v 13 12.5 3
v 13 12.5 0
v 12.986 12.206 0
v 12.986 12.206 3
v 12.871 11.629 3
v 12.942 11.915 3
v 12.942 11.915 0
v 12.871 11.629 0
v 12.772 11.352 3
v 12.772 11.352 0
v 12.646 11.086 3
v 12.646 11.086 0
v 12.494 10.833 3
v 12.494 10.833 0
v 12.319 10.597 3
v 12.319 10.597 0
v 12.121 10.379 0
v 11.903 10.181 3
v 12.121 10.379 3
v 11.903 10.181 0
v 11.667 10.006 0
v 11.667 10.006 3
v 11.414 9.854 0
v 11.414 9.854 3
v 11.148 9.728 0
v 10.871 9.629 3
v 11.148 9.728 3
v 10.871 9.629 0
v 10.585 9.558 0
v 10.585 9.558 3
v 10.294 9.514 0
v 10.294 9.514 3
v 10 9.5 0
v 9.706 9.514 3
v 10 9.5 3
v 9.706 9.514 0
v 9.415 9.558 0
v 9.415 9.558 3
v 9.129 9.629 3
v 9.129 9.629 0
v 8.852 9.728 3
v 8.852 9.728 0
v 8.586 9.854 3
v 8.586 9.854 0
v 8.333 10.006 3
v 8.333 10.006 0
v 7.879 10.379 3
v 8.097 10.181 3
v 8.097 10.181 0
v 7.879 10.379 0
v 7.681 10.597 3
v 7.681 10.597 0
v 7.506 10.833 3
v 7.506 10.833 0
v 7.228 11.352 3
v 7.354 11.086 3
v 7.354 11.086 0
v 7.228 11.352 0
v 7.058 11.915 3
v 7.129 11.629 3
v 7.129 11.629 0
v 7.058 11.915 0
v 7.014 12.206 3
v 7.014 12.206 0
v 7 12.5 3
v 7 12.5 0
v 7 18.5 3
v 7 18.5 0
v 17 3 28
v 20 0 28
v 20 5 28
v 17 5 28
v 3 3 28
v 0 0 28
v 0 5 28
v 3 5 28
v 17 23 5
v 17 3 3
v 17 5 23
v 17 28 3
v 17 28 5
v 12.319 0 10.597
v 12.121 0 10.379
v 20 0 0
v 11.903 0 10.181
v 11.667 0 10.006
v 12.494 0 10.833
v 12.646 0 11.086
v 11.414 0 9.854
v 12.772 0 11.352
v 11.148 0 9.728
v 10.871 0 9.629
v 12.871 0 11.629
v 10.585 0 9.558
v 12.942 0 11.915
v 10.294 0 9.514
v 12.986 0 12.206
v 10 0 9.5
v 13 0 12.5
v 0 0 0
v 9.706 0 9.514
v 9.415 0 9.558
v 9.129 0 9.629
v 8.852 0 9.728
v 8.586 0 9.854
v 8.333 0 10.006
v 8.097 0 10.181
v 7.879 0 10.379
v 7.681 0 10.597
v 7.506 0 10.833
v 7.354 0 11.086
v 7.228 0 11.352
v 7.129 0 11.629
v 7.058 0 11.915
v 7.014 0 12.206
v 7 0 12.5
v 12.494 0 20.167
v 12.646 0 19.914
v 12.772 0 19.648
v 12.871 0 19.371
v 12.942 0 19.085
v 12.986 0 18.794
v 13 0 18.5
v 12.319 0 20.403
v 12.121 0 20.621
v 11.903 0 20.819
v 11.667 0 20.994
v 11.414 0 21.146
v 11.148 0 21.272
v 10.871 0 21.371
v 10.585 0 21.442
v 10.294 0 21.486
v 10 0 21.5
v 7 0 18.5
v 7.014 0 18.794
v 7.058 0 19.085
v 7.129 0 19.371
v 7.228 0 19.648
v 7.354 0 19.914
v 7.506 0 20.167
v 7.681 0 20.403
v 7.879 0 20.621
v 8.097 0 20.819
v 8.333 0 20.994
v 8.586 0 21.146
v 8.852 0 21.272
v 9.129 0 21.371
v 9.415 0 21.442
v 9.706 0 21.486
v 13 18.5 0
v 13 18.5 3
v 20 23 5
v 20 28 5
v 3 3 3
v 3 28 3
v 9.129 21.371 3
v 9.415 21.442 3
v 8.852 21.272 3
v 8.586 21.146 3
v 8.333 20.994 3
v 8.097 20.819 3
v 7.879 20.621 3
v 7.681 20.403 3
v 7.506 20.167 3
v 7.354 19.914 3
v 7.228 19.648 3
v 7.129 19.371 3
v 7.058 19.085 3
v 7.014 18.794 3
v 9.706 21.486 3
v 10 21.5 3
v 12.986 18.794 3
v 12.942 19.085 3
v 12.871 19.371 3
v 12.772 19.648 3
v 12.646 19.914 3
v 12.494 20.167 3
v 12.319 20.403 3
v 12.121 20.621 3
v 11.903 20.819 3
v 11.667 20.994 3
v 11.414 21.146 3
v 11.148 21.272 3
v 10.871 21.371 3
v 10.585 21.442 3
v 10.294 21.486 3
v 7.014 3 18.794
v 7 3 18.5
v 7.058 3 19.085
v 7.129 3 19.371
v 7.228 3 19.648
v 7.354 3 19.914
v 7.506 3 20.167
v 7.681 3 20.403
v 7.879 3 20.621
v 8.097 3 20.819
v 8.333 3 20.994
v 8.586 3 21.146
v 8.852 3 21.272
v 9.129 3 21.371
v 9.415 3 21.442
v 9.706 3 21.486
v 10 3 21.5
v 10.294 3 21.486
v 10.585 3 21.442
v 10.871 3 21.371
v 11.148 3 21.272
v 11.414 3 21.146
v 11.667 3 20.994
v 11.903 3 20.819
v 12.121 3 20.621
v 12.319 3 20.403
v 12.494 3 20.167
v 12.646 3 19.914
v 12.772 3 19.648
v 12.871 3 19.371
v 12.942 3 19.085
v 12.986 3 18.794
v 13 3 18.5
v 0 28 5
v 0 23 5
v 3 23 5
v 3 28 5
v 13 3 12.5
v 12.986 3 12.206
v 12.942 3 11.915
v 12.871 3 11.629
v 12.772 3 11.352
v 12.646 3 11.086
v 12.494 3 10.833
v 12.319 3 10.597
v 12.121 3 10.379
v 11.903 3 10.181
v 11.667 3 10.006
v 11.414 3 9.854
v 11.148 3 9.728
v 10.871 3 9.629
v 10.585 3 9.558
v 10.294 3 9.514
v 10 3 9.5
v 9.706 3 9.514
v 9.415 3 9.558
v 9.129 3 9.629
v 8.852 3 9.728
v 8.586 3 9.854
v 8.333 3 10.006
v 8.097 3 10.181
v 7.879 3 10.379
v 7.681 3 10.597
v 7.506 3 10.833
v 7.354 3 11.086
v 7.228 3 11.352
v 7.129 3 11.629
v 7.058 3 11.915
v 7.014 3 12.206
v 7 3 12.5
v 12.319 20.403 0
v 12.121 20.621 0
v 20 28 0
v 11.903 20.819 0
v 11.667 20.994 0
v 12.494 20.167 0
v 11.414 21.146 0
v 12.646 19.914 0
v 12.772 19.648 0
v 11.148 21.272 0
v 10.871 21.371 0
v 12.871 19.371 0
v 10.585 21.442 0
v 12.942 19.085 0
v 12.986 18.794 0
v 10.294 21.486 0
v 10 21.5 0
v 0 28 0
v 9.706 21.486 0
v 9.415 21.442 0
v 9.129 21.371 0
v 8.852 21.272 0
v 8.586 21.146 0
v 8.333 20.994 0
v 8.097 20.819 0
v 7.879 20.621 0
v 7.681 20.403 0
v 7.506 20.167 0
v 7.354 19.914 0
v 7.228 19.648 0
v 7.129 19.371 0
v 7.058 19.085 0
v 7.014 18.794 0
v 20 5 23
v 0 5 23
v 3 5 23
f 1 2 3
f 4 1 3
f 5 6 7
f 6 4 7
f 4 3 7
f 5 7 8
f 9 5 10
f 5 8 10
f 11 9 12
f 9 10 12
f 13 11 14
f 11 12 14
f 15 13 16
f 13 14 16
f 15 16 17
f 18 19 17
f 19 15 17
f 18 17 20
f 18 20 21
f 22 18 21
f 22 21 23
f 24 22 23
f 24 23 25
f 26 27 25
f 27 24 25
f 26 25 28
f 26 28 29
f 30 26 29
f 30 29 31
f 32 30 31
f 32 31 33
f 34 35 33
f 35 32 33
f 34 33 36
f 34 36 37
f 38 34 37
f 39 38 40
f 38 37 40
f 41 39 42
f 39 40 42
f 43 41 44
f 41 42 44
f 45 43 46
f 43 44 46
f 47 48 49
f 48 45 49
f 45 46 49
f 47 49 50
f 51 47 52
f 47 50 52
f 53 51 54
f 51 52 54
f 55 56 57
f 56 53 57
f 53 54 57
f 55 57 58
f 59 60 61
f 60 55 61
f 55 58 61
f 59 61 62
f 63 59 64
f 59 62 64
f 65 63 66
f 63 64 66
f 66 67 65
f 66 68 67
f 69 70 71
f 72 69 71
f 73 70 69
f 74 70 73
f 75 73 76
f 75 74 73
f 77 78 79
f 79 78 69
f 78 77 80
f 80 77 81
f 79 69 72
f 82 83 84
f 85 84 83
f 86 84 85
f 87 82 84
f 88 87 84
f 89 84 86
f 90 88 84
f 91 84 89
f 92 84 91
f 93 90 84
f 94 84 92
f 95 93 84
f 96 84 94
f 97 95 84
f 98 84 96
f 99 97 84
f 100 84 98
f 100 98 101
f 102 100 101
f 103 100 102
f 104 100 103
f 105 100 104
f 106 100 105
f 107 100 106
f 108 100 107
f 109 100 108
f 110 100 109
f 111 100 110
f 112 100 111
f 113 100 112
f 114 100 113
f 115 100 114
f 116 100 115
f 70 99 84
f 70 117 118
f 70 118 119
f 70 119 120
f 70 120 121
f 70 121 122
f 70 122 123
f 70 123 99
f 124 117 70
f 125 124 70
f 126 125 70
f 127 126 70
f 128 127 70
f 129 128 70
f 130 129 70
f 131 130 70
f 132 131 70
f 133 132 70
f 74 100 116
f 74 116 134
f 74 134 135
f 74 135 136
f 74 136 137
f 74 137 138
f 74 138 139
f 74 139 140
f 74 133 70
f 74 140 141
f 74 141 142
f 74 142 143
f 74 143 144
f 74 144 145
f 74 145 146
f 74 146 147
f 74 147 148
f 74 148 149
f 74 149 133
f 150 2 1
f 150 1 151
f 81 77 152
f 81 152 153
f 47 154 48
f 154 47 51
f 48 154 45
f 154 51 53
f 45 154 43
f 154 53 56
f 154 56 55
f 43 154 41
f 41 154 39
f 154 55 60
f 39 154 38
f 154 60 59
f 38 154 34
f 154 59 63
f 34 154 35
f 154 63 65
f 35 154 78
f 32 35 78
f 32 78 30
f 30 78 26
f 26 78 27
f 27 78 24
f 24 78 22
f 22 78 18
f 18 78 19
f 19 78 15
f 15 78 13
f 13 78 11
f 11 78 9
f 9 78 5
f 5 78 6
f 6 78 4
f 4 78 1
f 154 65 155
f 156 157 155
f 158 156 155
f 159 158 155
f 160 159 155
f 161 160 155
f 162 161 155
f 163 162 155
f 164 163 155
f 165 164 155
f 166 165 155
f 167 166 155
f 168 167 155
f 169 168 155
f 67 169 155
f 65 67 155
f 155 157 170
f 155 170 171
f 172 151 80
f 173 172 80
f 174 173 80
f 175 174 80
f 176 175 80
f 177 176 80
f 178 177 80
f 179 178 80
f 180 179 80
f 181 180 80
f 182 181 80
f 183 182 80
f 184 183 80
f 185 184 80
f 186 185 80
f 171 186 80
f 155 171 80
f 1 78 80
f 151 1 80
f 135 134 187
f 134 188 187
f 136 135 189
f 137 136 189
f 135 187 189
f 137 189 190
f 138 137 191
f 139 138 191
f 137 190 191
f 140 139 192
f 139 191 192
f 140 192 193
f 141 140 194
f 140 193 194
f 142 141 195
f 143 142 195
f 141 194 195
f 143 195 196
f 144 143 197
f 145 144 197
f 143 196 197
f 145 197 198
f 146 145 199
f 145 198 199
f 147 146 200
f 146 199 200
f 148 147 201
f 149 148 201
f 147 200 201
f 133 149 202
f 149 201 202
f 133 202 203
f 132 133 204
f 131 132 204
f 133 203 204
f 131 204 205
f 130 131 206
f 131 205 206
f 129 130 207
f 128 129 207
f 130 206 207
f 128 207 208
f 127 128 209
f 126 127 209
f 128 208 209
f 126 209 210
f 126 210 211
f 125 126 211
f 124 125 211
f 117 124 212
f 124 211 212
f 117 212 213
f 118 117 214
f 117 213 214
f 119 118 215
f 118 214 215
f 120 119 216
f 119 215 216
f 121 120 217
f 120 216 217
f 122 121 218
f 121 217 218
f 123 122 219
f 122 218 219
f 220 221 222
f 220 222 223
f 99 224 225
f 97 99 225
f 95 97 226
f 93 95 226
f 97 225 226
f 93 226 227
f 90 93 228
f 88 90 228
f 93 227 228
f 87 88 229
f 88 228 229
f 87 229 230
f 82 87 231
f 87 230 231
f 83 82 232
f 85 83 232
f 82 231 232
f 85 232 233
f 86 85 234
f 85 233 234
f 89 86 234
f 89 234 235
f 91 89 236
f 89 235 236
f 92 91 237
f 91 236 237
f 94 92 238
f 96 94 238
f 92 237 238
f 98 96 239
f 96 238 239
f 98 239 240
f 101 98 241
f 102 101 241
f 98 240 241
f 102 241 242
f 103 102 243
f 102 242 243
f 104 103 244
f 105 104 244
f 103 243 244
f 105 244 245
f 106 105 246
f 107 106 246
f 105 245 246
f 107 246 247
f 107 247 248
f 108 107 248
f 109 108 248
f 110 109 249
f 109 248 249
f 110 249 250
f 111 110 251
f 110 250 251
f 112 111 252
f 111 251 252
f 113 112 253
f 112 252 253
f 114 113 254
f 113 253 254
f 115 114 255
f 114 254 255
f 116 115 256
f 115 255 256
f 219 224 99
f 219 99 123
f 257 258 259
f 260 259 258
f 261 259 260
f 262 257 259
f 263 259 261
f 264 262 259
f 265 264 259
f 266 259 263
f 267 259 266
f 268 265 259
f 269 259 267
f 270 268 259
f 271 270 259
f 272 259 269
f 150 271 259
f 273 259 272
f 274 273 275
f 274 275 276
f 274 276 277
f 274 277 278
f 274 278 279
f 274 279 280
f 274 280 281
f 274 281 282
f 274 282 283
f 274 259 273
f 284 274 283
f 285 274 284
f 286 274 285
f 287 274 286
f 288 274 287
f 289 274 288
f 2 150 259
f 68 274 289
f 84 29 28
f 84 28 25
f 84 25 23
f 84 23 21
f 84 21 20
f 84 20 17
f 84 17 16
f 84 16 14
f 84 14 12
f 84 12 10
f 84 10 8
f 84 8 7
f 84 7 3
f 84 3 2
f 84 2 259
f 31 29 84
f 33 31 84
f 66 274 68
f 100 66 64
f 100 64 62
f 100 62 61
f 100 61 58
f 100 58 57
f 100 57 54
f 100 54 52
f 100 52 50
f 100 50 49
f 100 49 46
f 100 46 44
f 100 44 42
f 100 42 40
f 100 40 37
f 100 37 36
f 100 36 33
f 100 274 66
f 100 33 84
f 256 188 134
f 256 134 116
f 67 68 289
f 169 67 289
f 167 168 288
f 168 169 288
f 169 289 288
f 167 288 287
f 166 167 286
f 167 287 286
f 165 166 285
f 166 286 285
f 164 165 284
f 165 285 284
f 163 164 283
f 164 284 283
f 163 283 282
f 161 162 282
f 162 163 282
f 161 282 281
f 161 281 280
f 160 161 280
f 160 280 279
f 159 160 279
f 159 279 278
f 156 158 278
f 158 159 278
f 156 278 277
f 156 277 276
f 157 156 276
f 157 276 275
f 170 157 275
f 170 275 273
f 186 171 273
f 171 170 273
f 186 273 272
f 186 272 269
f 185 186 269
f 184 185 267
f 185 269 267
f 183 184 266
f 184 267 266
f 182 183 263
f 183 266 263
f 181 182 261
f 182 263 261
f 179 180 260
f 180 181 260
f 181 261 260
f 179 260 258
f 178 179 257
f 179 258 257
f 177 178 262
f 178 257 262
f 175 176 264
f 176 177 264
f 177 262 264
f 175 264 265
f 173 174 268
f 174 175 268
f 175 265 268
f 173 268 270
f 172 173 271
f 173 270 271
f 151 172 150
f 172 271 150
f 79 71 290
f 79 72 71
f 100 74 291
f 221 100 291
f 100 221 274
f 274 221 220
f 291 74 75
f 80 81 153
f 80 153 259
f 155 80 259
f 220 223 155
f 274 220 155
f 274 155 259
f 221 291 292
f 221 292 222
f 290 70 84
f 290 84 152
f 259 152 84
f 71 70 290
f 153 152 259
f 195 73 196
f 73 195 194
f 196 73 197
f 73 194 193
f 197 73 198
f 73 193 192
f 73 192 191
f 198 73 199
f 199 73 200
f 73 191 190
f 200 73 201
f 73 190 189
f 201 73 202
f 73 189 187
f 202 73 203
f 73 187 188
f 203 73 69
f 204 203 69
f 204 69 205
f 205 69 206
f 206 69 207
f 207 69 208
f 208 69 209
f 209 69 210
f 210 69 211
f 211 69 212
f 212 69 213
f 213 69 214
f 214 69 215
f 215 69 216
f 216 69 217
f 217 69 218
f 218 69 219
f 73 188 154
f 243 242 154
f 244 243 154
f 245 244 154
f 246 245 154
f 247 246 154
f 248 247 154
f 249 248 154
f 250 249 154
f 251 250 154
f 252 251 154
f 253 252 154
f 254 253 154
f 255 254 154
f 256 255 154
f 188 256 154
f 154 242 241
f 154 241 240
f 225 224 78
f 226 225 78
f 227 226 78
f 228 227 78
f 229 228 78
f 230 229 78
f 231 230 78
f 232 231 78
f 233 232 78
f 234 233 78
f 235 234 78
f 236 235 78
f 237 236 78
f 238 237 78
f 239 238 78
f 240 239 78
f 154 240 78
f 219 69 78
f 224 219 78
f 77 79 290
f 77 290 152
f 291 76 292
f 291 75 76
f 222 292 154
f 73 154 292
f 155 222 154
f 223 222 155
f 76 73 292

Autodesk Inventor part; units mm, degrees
ref_plane "XZ Plane" through (0, 0, 0) normal (0, 1, 0) x (-1, 0, 0)
ref_plane "XY Plane" through (0, 0, 0) normal (0, 0, 1) x (1, 0, 0)
sketch "Sketch1" plane through (0, 0, 0) normal (1, 0, 0) x (0, 1, 0)
  line L0 (28, 5) -> (28, 0)
  line L1 (5, 23) -> (23, 5)
  line L2 (5, 28) -> (5, 23)
  line L3 (0, 0) -> (0, 28)
  line L4 (23, 5) -> (28, 5)
  line L5 (0, 28) -> (5, 28)
  line L6 (28, 0) -> (0, 0)
extrude "Extrusion4" add sketch "Sketch1" along normal blind 20
ref_plane "Work Plane1" through (17, 0, 0) normal (1, 0, 0) x (0, 1, 0)
sketch "Sketch2" plane through (17, 0, 0) normal (1, 0, 0) x (0, 1, 0)
  line L0 (3, 28) -> (3, 3)
  line L1 (5, 23) -> (23, 5)
  line L2 (3, 28) -> (5, 28)
  line L3 (23, 5) -> (28, 5)
  line L4 (3, 3) -> (28, 3)
  line L5 (5, 28) -> (5, 23)
  line L6 (28, 5) -> (28, 3)
extrude "Extrusion3" cut sketch "Sketch2" against normal blind 14
sketch "Sketch3" plane through (17, 3, 28) normal (0, 1, 0) x (1, 0, 0)
  arc A0 (-10, 9.5) -> (-4, 9.5) centre (-7, 9.5) ccw
  line L0 (-10, 9.5) -> (-10, 15.5)
  arc A1 (-4, 15.5) -> (-10, 15.5) centre (-7, 15.5) ccw
  line L1 (-4, 15.5) -> (-4, 9.5)
extrude "Extrusion2" cut sketch "Sketch3" against normal blind 3
sketch "Sketch4" plane through (0, 0, 0) normal (0, 0, 1) x (1, 0, 0)
  arc A0 (13, 18.5) -> (7, 18.5) centre (10, 18.5) ccw
  arc A1 (7, 12.5) -> (13, 12.5) centre (10, 12.5) ccw
  line L0 (13, 12.5) -> (13, 18.5)
  line L1 (7, 18.5) -> (7, 12.5)
extrude "Extrusion1" cut sketch "Sketch4" along normal blind 3 draft 0
properties part number "Corner Connector"
